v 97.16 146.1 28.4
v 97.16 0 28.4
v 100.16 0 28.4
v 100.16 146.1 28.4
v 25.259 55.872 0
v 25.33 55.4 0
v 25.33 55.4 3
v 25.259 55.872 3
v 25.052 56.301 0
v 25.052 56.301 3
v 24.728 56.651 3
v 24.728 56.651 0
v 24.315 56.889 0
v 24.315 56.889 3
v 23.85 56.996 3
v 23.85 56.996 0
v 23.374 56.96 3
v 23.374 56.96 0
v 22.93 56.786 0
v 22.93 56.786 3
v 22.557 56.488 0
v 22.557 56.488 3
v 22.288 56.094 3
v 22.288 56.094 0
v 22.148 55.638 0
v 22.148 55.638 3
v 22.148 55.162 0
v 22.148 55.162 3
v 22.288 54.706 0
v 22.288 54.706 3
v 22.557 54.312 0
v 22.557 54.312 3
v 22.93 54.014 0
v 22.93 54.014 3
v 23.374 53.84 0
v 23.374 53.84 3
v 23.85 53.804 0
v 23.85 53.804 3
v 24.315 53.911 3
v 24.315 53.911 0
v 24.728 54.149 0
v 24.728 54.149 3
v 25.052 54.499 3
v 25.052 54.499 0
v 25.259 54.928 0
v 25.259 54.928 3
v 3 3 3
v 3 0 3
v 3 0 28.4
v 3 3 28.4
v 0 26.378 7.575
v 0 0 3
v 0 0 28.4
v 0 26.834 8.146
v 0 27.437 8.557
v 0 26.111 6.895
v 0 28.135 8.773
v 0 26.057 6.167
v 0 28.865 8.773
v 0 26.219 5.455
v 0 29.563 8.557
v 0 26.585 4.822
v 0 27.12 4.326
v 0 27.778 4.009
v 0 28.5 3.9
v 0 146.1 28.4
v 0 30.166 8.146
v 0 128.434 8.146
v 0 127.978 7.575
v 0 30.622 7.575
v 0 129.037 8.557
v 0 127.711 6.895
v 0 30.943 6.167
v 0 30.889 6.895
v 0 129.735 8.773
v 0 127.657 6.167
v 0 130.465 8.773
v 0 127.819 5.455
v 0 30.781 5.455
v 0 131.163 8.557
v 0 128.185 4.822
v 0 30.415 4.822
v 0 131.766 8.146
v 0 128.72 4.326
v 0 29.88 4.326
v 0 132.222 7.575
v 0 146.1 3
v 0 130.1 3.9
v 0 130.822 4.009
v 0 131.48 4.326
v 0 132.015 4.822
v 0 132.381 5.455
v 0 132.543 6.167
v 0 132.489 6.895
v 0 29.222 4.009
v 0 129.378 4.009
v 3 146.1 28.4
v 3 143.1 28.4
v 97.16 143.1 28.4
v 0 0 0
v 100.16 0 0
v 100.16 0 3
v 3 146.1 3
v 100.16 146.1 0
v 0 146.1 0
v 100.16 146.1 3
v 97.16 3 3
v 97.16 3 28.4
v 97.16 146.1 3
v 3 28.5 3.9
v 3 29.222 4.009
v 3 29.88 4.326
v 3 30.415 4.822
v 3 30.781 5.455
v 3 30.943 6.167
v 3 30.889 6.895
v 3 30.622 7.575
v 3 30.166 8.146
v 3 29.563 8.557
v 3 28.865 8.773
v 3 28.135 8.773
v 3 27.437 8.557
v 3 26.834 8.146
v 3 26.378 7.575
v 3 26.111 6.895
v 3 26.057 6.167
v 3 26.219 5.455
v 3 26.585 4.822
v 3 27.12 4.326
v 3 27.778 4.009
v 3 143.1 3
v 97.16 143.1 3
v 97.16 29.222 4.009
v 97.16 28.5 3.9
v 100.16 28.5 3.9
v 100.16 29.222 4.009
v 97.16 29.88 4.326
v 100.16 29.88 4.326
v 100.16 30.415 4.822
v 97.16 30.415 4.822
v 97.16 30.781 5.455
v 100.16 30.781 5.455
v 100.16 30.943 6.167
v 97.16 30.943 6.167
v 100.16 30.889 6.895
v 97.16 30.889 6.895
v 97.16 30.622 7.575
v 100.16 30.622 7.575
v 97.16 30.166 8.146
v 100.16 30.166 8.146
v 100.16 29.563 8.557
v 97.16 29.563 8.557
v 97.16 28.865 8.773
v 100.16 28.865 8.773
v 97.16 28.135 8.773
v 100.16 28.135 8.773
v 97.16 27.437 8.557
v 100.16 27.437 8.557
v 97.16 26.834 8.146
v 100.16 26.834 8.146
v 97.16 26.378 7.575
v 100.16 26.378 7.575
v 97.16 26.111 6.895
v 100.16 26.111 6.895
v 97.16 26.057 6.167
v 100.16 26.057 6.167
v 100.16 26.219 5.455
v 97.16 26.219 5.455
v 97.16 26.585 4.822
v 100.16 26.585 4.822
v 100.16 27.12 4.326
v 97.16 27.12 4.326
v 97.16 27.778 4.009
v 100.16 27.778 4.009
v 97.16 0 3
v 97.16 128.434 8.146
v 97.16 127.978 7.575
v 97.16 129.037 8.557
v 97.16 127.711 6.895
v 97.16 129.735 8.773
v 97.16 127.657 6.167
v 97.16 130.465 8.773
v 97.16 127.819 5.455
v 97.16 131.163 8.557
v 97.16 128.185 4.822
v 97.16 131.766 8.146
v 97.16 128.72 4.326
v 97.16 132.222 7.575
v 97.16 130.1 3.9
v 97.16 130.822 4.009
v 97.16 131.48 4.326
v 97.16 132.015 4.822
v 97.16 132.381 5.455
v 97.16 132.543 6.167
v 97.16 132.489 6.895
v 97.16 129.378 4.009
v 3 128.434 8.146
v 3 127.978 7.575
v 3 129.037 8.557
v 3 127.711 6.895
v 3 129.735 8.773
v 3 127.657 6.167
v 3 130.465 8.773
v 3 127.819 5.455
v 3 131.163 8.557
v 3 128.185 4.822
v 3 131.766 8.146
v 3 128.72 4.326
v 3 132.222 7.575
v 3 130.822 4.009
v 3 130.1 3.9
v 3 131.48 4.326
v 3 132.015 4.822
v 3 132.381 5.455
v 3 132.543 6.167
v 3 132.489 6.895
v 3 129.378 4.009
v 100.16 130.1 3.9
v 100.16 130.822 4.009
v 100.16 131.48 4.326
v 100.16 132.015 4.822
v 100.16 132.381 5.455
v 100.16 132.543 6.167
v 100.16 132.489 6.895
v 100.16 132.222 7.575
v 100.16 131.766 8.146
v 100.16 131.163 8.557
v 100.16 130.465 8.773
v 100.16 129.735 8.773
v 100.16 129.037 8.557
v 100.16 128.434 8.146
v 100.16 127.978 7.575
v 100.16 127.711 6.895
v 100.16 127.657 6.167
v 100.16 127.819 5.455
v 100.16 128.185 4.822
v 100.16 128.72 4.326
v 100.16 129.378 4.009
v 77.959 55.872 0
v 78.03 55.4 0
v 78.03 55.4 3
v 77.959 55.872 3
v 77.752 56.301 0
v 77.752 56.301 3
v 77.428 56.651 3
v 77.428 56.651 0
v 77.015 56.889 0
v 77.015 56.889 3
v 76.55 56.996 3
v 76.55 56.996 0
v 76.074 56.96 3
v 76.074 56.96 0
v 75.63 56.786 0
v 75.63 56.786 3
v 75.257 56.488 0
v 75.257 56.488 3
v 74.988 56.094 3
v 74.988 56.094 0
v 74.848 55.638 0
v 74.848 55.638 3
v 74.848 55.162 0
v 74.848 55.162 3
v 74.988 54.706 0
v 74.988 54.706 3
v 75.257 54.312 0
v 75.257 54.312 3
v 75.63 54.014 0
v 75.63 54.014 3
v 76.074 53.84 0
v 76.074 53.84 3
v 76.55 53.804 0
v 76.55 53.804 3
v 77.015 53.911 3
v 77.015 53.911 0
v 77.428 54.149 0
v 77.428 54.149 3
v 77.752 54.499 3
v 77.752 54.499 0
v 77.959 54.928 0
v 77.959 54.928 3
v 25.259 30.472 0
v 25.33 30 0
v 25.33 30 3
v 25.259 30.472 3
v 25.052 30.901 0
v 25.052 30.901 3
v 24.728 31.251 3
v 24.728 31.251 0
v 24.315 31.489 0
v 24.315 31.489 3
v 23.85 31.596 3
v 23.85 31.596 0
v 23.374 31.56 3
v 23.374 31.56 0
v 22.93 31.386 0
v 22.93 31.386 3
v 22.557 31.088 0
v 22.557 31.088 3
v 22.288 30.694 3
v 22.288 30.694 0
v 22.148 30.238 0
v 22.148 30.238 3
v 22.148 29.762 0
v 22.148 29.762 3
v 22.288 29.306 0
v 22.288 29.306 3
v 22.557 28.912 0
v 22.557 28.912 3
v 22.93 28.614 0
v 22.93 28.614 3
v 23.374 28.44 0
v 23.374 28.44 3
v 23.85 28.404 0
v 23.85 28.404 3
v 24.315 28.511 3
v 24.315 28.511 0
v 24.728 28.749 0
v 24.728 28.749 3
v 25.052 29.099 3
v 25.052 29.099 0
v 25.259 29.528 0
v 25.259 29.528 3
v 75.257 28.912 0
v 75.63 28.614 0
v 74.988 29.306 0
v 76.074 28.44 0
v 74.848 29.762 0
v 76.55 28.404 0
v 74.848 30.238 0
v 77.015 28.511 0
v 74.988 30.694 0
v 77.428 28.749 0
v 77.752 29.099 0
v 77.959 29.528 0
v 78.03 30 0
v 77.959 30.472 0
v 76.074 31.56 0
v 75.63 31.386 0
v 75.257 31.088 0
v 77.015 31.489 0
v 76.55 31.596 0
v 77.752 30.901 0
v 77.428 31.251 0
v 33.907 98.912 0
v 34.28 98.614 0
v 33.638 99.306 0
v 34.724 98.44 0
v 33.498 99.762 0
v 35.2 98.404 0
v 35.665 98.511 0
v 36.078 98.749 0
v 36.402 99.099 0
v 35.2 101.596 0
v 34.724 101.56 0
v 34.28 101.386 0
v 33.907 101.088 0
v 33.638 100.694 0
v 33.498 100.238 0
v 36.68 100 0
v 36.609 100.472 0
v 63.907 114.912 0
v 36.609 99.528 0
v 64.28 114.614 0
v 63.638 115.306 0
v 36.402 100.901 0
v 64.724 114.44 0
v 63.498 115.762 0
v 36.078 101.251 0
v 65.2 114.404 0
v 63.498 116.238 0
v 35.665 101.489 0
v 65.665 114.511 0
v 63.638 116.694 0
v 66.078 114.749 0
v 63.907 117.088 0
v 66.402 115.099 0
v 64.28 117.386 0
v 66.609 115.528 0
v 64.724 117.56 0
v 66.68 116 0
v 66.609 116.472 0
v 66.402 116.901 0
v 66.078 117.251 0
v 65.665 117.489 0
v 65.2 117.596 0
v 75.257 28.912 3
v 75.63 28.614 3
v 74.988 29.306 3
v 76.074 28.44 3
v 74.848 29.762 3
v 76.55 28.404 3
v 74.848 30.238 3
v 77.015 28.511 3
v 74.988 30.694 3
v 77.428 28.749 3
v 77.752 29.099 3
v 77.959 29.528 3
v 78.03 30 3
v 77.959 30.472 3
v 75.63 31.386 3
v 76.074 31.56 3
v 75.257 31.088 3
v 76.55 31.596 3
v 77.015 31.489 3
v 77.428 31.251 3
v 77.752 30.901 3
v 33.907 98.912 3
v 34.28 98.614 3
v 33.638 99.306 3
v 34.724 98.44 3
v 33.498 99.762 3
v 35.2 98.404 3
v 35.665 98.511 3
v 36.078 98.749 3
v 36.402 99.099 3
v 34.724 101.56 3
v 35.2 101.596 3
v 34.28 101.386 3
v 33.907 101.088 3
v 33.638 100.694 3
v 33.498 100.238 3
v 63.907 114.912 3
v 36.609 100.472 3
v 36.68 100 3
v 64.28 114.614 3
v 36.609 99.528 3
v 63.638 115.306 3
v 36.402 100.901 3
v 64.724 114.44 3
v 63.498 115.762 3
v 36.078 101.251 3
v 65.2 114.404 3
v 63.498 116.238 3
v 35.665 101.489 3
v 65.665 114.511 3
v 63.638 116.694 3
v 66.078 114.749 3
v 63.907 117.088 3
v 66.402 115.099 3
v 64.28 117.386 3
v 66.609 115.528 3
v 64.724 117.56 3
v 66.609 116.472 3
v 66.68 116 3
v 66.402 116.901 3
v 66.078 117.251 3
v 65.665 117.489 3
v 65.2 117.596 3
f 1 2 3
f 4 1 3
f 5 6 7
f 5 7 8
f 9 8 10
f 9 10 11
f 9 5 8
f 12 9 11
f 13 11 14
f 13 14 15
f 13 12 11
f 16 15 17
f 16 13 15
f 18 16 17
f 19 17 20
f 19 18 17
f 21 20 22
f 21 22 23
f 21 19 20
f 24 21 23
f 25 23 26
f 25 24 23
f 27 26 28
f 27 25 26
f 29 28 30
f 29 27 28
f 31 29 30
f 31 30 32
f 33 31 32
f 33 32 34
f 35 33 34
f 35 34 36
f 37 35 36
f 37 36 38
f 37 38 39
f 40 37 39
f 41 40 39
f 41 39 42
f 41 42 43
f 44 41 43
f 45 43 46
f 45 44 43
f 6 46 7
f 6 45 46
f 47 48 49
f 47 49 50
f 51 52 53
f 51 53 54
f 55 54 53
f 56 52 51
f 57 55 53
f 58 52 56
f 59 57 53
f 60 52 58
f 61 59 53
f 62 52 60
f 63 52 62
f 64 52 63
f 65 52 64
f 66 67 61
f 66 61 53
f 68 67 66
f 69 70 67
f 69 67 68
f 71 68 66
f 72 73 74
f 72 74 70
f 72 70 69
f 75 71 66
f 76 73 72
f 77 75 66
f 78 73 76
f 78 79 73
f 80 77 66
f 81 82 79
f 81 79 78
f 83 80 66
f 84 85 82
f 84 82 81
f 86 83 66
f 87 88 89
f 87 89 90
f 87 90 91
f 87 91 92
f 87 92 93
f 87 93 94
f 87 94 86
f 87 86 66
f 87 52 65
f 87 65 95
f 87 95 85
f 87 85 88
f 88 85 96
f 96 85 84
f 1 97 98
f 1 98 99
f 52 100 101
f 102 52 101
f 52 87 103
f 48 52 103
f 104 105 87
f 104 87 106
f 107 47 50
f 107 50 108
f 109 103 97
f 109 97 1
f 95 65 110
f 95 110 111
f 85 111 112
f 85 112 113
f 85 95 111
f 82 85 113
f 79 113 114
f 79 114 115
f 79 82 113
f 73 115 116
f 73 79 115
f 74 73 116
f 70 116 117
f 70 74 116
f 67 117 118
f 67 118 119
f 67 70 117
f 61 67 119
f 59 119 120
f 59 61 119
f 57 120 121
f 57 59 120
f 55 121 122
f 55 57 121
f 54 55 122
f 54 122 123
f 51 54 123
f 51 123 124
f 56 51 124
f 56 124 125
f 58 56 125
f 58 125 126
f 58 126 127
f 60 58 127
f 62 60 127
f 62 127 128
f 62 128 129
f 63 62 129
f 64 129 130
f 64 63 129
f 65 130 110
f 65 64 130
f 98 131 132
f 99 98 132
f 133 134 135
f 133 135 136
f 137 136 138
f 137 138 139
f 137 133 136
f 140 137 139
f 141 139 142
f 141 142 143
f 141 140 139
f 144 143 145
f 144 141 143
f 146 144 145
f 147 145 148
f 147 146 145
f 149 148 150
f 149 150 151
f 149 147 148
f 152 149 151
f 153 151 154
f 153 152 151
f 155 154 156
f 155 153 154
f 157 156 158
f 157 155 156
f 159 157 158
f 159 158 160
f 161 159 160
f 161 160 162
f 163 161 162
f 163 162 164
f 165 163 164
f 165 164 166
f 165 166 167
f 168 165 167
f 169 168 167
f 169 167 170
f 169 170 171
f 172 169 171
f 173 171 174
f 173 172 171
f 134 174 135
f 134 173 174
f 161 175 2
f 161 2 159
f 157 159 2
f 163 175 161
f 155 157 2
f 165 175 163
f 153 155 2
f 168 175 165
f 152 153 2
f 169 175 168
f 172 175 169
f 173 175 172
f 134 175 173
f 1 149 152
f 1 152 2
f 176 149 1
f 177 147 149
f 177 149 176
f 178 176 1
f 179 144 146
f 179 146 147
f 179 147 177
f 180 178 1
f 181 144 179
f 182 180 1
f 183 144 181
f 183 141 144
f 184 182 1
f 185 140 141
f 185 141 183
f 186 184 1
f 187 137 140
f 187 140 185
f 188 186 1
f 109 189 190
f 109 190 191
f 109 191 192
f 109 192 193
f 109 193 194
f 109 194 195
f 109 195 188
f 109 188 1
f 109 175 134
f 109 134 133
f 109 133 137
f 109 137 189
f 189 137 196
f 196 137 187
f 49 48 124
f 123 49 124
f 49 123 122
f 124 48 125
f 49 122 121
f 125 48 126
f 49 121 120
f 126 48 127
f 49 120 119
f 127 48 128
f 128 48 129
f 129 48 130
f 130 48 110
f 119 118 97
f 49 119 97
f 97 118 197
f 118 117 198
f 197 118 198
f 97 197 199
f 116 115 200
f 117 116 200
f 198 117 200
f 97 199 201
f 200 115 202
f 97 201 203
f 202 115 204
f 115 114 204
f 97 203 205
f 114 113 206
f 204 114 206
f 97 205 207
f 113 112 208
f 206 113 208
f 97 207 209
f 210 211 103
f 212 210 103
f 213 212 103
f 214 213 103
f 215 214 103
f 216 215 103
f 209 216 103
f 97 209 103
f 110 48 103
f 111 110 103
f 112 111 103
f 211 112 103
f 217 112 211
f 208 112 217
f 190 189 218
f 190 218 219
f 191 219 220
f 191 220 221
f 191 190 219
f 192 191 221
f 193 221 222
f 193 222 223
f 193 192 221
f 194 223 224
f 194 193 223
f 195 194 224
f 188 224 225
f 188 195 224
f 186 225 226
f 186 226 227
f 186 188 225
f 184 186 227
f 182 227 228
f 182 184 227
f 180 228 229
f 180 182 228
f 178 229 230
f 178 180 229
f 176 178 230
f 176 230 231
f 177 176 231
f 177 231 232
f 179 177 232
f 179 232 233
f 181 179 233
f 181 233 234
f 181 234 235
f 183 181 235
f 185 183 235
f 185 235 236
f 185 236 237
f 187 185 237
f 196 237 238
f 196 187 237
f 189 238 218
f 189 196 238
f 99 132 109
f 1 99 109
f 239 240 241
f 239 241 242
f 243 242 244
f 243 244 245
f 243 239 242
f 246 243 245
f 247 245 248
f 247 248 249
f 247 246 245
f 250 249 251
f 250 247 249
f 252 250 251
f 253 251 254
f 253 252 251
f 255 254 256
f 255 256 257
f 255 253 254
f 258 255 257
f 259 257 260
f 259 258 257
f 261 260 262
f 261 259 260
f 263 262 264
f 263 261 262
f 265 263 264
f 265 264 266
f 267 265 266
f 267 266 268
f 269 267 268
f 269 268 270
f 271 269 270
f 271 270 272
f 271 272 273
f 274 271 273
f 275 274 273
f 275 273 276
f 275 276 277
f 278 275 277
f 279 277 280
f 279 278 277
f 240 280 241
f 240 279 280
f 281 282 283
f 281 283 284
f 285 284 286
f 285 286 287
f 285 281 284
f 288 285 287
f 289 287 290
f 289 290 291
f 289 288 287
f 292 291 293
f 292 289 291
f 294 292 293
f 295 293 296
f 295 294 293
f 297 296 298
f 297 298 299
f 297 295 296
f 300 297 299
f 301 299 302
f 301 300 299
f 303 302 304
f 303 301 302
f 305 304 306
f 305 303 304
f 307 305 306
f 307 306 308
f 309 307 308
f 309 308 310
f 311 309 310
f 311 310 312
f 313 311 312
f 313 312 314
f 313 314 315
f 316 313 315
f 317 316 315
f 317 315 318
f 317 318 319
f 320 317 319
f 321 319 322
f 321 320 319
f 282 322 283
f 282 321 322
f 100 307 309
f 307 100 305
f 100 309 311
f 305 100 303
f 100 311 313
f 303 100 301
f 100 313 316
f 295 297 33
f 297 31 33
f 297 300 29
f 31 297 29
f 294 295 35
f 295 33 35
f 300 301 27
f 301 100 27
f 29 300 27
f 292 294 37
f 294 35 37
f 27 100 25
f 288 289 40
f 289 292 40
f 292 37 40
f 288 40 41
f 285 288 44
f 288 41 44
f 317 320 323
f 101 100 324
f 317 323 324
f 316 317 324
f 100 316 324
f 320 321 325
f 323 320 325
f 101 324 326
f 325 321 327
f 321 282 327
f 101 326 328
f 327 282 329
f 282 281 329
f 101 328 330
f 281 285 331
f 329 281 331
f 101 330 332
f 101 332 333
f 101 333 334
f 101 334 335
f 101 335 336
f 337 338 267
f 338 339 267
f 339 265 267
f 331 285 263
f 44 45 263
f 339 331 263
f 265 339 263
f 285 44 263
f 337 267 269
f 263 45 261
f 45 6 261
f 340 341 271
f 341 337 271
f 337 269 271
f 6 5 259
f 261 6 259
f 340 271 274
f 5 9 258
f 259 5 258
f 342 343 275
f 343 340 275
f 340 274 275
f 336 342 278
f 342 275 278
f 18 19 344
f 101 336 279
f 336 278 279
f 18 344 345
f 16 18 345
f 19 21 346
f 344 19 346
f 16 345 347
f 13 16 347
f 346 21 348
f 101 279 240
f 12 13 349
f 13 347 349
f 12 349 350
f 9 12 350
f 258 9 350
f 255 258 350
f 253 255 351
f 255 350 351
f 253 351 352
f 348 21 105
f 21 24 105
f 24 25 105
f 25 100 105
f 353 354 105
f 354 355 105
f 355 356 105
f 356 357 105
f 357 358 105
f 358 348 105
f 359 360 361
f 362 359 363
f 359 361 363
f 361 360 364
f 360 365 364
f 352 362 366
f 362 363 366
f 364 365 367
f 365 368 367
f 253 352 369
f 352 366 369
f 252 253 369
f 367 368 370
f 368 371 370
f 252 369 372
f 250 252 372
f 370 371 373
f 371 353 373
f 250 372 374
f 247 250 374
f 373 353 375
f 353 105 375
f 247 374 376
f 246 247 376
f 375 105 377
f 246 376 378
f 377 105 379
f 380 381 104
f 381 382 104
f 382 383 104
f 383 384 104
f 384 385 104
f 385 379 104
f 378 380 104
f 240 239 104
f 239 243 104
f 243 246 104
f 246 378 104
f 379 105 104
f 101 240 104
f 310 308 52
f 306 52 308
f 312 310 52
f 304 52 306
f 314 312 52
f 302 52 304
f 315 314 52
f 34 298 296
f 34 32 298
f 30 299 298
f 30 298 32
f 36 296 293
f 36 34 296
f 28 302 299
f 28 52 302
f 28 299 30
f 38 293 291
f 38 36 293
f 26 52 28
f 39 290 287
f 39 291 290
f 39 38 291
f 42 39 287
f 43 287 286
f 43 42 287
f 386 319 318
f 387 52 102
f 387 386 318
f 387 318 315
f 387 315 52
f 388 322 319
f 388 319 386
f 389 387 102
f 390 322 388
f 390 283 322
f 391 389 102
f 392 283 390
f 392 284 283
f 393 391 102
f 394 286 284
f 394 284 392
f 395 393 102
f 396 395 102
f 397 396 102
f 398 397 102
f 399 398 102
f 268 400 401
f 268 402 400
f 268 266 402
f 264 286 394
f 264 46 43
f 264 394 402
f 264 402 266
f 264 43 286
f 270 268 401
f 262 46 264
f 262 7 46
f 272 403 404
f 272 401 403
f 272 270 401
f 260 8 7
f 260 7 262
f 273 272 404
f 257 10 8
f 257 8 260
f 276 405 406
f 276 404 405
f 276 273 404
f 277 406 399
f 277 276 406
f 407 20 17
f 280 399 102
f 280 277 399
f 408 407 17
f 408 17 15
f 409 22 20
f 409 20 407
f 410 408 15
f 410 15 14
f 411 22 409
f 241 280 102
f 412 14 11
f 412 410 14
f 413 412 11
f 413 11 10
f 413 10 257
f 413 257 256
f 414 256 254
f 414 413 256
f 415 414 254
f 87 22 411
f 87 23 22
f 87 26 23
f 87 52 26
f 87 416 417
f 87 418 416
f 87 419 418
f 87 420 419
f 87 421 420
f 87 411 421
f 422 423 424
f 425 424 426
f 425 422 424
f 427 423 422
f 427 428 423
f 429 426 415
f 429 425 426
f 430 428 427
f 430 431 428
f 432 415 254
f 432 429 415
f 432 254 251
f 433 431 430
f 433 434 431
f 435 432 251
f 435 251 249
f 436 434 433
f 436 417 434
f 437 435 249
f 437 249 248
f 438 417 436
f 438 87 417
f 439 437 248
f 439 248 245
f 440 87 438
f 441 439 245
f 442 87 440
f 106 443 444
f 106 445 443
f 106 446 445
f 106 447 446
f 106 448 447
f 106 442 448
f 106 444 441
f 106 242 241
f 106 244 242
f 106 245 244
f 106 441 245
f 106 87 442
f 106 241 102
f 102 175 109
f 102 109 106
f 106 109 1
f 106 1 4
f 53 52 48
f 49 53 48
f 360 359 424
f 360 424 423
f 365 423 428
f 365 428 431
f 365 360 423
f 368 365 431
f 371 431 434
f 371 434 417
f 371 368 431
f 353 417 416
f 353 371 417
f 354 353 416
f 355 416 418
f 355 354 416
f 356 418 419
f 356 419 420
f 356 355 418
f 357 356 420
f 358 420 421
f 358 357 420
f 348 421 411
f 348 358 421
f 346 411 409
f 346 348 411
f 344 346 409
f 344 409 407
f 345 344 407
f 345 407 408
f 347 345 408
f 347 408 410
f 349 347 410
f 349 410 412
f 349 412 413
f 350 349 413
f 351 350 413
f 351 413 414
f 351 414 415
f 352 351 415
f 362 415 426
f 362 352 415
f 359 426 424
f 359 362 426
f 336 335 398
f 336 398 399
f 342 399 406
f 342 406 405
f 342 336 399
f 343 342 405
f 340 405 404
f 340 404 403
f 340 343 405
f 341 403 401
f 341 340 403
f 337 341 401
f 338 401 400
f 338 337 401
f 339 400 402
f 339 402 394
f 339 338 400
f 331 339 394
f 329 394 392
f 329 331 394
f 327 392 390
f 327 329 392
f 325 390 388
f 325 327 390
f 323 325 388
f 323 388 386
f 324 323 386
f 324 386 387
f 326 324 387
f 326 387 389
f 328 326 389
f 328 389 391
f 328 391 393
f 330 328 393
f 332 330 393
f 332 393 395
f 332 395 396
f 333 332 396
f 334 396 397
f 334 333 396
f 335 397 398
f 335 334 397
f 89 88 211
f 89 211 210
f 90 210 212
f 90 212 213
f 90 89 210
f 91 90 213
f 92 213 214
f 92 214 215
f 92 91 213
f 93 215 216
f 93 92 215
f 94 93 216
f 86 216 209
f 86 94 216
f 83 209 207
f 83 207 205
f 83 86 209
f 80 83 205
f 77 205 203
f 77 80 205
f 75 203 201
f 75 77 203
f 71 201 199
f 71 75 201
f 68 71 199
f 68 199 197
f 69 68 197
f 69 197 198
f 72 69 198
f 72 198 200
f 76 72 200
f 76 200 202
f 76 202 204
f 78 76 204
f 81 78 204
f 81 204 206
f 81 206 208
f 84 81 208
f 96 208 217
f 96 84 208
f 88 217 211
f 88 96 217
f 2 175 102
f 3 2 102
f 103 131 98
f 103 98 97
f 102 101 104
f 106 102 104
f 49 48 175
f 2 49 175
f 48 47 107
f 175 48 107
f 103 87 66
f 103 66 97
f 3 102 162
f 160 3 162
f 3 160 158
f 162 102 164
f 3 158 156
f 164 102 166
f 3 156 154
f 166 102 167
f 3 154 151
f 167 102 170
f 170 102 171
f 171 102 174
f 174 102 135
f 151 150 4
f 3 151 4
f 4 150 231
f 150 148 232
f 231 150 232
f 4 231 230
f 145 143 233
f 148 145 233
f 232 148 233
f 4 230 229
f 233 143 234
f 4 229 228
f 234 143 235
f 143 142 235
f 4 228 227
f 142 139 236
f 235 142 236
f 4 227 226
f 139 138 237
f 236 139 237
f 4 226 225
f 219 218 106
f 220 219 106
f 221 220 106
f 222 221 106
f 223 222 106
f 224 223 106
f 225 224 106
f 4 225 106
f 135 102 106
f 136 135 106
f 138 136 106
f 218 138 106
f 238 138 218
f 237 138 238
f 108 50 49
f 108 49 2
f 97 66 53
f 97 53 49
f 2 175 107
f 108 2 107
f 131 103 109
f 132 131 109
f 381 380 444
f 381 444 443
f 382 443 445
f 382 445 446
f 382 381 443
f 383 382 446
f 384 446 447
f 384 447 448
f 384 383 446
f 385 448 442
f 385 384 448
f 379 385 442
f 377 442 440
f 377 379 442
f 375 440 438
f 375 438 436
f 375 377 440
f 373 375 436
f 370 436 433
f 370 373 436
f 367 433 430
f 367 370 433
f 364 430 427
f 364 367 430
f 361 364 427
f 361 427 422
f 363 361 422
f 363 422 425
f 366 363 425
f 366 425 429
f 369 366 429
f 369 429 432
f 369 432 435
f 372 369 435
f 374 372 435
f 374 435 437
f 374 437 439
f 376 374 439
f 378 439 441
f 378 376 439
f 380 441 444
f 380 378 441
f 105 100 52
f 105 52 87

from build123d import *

# Parameters (mm, degrees)
BOX003_W          = 94.16
BOX003_H          = 3
BOX003_DEPTH      = 25.4
BOX004_W          = 94.16
BOX004_H          = 3
BOX004_DEPTH      = 25.4
CYLINDER002_R     = 1.6
CYLINDER002_DEPTH = 3
ARRAY002_X_COUNT  = 2
ARRAY002_X_PITCH  = 34
CYLINDER001_R     = 1.6
CYLINDER001_DEPTH = 3
ARRAY001_X_COUNT  = 2
ARRAY001_X_PITCH  = 52.7
ARRAY001_Y_COUNT  = 2
ARRAY001_Y_PITCH  = 25.4
BOX_W             = 100.16
BOX_H             = 146.1
BOX_DEPTH         = 3
CYLINDER_R        = 2.45
CYLINDER_DEPTH    = 3
ARRAY_X_COUNT     = 2
ARRAY_X_PITCH     = 97.16
ARRAY_Y_COUNT     = 2
ARRAY_Y_PITCH     = 101.6
BOX002_W          = 3
BOX002_H          = 146.1
BOX002_DEPTH      = 25.4
BOX001_W          = 3
BOX001_H          = 146.1
BOX001_DEPTH      = 25.4


with BuildPart() as front:
    # Box003 → Box003 (new body)
    with BuildSketch(Plane(origin=(3, 0, 3), x_dir=(1, 0, 0), z_dir=(0, 0, 1))):
        with Locations((47.08, 1.5)):
            Rectangle(BOX003_W, BOX003_H)
    extrude(amount=BOX003_DEPTH)


with BuildPart() as back:
    # Box004 → Box004 (new body)
    with BuildSketch(Plane(origin=(3, 143.1, 3), x_dir=(1, 0, 0), z_dir=(0, 0, 1))):
        with Locations((47.08, 1.5)):
            Rectangle(BOX004_W, BOX004_H)
    extrude(amount=BOX004_DEPTH)


with BuildPart() as psuholes:
    # Cylinder002 → Cylinder002 (new body)
    with BuildSketch(Plane.XY):
        Circle(CYLINDER002_R)
    extrude(amount=CYLINDER002_DEPTH)

    # Array002 X: PSUHoles ×2


with BuildPart() as psuholes_1:
    add(psuholes.part)
    with Locations(*[Vector(0.882353, 0.470588, 0) * (i * ARRAY002_X_PITCH) for i in range(1, ARRAY002_X_COUNT)]):
        add(psuholes.part)


with BuildPart() as psuholes_2:
    # Array002 placement: moved
    add(psuholes_1.part.moved(Location((35.08, 100, 0))))


with BuildPart() as holes:
    # Cylinder001 → Cylinder001 (new body)
    with BuildSketch(Plane.XY):
        Circle(CYLINDER001_R)
    extrude(amount=CYLINDER001_DEPTH)

    # Array001 X: holes ×2


with BuildPart() as holes_1:
    add(holes.part)
    with Locations(*[(i * ARRAY001_X_PITCH, 0, 0) for i in range(1, ARRAY001_X_COUNT)]):
        add(holes.part)

    # Array001 Y: holes ×2


with BuildPart() as holes_2:
    add(holes_1.part)
    with Locations(*[(0, i * ARRAY001_Y_PITCH, 0) for i in range(1, ARRAY001_Y_COUNT)]):
        add(holes_1.part)


with BuildPart() as holes_3:
    # Array001 placement: moved
    add(holes_2.part.moved(Location((23.73, 30, 0))))

    # Compound001: union PSUHoles
    add(psuholes_2.part)


with BuildPart() as bottomwithholes:
    # Box → Box (new body)
    with BuildSketch(Plane.XY):
        with Locations((50.08, 73.05)):
            Rectangle(BOX_W, BOX_H)
    extrude(amount=BOX_DEPTH)

    # Cut: cut holes
    add(holes_3.part, mode=Mode.SUBTRACT)


with BuildPart() as mountingholes:
    # Cylinder → Cylinder (new body)
    with BuildSketch(Plane(origin=(0, 28.5, 6.35), x_dir=(0, 0, -1), z_dir=(1, 0, 0))):
        Circle(CYLINDER_R)
    extrude(amount=CYLINDER_DEPTH)

    # Array X: mountingHoles ×2


with BuildPart() as mountingholes_1:
    add(mountingholes.part)
    with Locations(*[(i * ARRAY_X_PITCH, 0, 0) for i in range(1, ARRAY_X_COUNT)]):
        add(mountingholes.part)

    # Array Y: mountingHoles ×2


with BuildPart() as mountingholes_2:
    add(mountingholes_1.part)
    with Locations(*[(0, i * ARRAY_Y_PITCH, 0) for i in range(1, ARRAY_Y_COUNT)]):
        add(mountingholes_1.part)


with BuildPart() as sideb:
    # Box002 → Box002 (new body)
    with BuildSketch(Plane(origin=(97.16, 0, 3), x_dir=(1, 0, 0), z_dir=(0, 0, 1))):
        with Locations((1.5, 73.05)):
            Rectangle(BOX002_W, BOX002_H)
    extrude(amount=BOX002_DEPTH)


with BuildPart() as sideswithholes:
    # Box001 → Box001 (new body)
    with BuildSketch(Plane.XY.offset(3)):
        with Locations((1.5, 73.05)):
            Rectangle(BOX001_W, BOX001_H)
    extrude(amount=BOX001_DEPTH)

    # Compound002: union sideB
    add(sideb.part)

    # Cut001: cut mountingHoles
    add(mountingholes_2.part, mode=Mode.SUBTRACT)


solid = Compound([front.part, back.part, bottomwithholes.part, sideswithholes.part])
